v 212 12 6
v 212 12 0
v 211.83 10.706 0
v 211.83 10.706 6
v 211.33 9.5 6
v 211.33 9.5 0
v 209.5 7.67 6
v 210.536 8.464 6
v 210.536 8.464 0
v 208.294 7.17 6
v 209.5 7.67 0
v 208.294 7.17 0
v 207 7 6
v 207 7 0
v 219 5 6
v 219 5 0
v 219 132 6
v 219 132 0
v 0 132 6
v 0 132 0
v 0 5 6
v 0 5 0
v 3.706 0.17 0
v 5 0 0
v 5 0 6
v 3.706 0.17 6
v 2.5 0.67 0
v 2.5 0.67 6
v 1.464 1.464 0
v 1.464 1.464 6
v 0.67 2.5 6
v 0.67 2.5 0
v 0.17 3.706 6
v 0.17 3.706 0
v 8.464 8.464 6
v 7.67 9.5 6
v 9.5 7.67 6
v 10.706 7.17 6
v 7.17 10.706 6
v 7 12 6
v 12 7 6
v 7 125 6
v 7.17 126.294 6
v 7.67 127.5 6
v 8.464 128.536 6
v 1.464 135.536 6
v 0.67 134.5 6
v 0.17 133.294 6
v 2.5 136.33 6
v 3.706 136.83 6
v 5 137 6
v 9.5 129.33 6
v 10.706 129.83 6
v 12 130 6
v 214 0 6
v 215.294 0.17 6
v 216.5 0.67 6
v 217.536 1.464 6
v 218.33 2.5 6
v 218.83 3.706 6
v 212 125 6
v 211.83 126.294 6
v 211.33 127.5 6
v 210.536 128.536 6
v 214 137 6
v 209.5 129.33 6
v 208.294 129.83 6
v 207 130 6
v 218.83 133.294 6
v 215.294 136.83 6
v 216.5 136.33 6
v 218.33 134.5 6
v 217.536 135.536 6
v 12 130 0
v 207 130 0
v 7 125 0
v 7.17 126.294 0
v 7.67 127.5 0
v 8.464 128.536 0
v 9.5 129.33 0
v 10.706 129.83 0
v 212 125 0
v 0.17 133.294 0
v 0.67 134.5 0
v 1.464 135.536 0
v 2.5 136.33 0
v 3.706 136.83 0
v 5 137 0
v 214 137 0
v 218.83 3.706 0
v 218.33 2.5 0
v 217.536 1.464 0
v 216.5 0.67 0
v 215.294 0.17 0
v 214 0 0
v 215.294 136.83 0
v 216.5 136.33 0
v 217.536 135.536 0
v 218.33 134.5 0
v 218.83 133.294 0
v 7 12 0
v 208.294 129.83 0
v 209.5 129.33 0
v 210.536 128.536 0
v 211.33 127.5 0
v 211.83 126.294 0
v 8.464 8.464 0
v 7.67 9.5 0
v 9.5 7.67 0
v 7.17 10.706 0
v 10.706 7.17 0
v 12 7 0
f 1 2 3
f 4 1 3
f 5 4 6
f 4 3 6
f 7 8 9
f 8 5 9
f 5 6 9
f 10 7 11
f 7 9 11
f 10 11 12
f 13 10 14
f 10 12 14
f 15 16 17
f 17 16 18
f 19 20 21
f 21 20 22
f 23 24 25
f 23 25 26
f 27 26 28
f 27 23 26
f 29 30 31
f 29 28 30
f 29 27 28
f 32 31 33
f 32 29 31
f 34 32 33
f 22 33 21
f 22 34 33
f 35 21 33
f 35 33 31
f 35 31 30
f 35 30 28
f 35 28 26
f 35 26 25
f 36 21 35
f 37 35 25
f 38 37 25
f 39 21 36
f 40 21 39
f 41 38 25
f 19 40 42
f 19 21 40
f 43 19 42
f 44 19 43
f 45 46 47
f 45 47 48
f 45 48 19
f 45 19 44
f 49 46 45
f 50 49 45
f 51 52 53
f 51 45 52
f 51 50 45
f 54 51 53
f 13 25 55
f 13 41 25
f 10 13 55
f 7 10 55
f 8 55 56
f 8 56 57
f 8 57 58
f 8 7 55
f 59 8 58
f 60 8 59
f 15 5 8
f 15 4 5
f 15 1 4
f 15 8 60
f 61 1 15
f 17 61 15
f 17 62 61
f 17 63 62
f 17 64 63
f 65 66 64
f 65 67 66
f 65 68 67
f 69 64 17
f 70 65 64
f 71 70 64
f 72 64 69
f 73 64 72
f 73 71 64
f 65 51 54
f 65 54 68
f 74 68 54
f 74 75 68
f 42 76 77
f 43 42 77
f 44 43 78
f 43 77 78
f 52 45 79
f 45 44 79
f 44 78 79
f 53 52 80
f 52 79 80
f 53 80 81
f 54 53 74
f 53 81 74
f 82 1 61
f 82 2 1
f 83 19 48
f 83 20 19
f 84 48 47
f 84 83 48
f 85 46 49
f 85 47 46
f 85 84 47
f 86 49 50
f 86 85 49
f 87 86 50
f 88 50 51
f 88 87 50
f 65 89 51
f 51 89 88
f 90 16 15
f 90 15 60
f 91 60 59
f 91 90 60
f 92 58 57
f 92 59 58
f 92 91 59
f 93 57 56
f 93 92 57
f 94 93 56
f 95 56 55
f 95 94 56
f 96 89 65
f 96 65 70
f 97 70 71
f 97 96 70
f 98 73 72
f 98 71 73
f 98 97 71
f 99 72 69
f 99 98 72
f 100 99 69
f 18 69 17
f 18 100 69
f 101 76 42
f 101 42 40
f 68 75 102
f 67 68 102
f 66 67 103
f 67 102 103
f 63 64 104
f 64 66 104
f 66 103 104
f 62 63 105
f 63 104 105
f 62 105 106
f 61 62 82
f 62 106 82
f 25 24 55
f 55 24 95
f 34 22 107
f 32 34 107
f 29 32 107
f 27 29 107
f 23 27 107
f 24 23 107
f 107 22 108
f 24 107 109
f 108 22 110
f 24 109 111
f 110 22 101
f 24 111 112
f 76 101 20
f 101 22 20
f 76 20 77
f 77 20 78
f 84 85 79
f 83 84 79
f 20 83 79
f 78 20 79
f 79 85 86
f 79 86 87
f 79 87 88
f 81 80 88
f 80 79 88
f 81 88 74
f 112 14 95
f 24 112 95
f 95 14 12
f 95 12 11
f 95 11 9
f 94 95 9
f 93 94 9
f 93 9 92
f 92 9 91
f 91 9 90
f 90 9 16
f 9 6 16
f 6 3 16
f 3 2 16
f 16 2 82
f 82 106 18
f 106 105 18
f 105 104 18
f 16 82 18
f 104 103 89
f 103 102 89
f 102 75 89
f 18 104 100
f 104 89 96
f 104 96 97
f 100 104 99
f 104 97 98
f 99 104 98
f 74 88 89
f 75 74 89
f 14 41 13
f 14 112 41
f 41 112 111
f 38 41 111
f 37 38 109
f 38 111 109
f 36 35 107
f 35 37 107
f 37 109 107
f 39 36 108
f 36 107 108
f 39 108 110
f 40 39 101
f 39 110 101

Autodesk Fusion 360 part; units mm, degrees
sketch "Esquisse1" plane through (0, 0, 0) normal (0, 0, 1) x (1, 0, 0)
  line L0 (5, 0) -> (214, 0)
  line L1 (219, 5) -> (219, 132)
  line L2 (214, 137) -> (5, 137)
  line L3 (0, 132) -> (0, 5)
  line L4 (12, 7) -> (207, 7)
  line L5 (212, 12) -> (212, 125)
  line L6 (207, 130) -> (12, 130)
  line L7 (7, 125) -> (7, 12)
  arc A0 (219, 132) -> (214, 137) centre (214, 132) ccw
  arc A1 (212, 125) -> (207, 130) centre (207, 125) ccw
  arc A2 (214, 0) -> (219, 5) centre (214, 5) ccw
  arc A3 (207, 7) -> (212, 12) centre (207, 12) ccw
  arc A4 (7, 12) -> (12, 7) centre (12, 12) ccw
  arc A5 (0, 5) -> (5, 0) centre (5, 5) ccw
  arc A6 (12, 130) -> (7, 125) centre (12, 125) ccw
  arc A7 (5, 137) -> (0, 132) centre (5, 132) ccw
  point P0 (219, 137)
  point P1 (0, 137)
  point P2 (7, 7)
  point P3 (212, 130)
  point P4 (7, 130)
  dimension "d1" = 219
  dimension "d2" = 205
  dimension "d3" = 7
  dimension "d4" = 123
  dimension "d5" = 7
  dimension "d6" = 137
  dimension "d7" = 5
  dimension "d8" = 5
  dimension "d9" = 5
  dimension "d10" = 5
  dimension "d11" = 5
  dimension "d12" = 5
  dimension "d13" = 5
  dimension "d14" = 5
extrude "Extrusion1" add sketch "Esquisse1" along normal blind 6
